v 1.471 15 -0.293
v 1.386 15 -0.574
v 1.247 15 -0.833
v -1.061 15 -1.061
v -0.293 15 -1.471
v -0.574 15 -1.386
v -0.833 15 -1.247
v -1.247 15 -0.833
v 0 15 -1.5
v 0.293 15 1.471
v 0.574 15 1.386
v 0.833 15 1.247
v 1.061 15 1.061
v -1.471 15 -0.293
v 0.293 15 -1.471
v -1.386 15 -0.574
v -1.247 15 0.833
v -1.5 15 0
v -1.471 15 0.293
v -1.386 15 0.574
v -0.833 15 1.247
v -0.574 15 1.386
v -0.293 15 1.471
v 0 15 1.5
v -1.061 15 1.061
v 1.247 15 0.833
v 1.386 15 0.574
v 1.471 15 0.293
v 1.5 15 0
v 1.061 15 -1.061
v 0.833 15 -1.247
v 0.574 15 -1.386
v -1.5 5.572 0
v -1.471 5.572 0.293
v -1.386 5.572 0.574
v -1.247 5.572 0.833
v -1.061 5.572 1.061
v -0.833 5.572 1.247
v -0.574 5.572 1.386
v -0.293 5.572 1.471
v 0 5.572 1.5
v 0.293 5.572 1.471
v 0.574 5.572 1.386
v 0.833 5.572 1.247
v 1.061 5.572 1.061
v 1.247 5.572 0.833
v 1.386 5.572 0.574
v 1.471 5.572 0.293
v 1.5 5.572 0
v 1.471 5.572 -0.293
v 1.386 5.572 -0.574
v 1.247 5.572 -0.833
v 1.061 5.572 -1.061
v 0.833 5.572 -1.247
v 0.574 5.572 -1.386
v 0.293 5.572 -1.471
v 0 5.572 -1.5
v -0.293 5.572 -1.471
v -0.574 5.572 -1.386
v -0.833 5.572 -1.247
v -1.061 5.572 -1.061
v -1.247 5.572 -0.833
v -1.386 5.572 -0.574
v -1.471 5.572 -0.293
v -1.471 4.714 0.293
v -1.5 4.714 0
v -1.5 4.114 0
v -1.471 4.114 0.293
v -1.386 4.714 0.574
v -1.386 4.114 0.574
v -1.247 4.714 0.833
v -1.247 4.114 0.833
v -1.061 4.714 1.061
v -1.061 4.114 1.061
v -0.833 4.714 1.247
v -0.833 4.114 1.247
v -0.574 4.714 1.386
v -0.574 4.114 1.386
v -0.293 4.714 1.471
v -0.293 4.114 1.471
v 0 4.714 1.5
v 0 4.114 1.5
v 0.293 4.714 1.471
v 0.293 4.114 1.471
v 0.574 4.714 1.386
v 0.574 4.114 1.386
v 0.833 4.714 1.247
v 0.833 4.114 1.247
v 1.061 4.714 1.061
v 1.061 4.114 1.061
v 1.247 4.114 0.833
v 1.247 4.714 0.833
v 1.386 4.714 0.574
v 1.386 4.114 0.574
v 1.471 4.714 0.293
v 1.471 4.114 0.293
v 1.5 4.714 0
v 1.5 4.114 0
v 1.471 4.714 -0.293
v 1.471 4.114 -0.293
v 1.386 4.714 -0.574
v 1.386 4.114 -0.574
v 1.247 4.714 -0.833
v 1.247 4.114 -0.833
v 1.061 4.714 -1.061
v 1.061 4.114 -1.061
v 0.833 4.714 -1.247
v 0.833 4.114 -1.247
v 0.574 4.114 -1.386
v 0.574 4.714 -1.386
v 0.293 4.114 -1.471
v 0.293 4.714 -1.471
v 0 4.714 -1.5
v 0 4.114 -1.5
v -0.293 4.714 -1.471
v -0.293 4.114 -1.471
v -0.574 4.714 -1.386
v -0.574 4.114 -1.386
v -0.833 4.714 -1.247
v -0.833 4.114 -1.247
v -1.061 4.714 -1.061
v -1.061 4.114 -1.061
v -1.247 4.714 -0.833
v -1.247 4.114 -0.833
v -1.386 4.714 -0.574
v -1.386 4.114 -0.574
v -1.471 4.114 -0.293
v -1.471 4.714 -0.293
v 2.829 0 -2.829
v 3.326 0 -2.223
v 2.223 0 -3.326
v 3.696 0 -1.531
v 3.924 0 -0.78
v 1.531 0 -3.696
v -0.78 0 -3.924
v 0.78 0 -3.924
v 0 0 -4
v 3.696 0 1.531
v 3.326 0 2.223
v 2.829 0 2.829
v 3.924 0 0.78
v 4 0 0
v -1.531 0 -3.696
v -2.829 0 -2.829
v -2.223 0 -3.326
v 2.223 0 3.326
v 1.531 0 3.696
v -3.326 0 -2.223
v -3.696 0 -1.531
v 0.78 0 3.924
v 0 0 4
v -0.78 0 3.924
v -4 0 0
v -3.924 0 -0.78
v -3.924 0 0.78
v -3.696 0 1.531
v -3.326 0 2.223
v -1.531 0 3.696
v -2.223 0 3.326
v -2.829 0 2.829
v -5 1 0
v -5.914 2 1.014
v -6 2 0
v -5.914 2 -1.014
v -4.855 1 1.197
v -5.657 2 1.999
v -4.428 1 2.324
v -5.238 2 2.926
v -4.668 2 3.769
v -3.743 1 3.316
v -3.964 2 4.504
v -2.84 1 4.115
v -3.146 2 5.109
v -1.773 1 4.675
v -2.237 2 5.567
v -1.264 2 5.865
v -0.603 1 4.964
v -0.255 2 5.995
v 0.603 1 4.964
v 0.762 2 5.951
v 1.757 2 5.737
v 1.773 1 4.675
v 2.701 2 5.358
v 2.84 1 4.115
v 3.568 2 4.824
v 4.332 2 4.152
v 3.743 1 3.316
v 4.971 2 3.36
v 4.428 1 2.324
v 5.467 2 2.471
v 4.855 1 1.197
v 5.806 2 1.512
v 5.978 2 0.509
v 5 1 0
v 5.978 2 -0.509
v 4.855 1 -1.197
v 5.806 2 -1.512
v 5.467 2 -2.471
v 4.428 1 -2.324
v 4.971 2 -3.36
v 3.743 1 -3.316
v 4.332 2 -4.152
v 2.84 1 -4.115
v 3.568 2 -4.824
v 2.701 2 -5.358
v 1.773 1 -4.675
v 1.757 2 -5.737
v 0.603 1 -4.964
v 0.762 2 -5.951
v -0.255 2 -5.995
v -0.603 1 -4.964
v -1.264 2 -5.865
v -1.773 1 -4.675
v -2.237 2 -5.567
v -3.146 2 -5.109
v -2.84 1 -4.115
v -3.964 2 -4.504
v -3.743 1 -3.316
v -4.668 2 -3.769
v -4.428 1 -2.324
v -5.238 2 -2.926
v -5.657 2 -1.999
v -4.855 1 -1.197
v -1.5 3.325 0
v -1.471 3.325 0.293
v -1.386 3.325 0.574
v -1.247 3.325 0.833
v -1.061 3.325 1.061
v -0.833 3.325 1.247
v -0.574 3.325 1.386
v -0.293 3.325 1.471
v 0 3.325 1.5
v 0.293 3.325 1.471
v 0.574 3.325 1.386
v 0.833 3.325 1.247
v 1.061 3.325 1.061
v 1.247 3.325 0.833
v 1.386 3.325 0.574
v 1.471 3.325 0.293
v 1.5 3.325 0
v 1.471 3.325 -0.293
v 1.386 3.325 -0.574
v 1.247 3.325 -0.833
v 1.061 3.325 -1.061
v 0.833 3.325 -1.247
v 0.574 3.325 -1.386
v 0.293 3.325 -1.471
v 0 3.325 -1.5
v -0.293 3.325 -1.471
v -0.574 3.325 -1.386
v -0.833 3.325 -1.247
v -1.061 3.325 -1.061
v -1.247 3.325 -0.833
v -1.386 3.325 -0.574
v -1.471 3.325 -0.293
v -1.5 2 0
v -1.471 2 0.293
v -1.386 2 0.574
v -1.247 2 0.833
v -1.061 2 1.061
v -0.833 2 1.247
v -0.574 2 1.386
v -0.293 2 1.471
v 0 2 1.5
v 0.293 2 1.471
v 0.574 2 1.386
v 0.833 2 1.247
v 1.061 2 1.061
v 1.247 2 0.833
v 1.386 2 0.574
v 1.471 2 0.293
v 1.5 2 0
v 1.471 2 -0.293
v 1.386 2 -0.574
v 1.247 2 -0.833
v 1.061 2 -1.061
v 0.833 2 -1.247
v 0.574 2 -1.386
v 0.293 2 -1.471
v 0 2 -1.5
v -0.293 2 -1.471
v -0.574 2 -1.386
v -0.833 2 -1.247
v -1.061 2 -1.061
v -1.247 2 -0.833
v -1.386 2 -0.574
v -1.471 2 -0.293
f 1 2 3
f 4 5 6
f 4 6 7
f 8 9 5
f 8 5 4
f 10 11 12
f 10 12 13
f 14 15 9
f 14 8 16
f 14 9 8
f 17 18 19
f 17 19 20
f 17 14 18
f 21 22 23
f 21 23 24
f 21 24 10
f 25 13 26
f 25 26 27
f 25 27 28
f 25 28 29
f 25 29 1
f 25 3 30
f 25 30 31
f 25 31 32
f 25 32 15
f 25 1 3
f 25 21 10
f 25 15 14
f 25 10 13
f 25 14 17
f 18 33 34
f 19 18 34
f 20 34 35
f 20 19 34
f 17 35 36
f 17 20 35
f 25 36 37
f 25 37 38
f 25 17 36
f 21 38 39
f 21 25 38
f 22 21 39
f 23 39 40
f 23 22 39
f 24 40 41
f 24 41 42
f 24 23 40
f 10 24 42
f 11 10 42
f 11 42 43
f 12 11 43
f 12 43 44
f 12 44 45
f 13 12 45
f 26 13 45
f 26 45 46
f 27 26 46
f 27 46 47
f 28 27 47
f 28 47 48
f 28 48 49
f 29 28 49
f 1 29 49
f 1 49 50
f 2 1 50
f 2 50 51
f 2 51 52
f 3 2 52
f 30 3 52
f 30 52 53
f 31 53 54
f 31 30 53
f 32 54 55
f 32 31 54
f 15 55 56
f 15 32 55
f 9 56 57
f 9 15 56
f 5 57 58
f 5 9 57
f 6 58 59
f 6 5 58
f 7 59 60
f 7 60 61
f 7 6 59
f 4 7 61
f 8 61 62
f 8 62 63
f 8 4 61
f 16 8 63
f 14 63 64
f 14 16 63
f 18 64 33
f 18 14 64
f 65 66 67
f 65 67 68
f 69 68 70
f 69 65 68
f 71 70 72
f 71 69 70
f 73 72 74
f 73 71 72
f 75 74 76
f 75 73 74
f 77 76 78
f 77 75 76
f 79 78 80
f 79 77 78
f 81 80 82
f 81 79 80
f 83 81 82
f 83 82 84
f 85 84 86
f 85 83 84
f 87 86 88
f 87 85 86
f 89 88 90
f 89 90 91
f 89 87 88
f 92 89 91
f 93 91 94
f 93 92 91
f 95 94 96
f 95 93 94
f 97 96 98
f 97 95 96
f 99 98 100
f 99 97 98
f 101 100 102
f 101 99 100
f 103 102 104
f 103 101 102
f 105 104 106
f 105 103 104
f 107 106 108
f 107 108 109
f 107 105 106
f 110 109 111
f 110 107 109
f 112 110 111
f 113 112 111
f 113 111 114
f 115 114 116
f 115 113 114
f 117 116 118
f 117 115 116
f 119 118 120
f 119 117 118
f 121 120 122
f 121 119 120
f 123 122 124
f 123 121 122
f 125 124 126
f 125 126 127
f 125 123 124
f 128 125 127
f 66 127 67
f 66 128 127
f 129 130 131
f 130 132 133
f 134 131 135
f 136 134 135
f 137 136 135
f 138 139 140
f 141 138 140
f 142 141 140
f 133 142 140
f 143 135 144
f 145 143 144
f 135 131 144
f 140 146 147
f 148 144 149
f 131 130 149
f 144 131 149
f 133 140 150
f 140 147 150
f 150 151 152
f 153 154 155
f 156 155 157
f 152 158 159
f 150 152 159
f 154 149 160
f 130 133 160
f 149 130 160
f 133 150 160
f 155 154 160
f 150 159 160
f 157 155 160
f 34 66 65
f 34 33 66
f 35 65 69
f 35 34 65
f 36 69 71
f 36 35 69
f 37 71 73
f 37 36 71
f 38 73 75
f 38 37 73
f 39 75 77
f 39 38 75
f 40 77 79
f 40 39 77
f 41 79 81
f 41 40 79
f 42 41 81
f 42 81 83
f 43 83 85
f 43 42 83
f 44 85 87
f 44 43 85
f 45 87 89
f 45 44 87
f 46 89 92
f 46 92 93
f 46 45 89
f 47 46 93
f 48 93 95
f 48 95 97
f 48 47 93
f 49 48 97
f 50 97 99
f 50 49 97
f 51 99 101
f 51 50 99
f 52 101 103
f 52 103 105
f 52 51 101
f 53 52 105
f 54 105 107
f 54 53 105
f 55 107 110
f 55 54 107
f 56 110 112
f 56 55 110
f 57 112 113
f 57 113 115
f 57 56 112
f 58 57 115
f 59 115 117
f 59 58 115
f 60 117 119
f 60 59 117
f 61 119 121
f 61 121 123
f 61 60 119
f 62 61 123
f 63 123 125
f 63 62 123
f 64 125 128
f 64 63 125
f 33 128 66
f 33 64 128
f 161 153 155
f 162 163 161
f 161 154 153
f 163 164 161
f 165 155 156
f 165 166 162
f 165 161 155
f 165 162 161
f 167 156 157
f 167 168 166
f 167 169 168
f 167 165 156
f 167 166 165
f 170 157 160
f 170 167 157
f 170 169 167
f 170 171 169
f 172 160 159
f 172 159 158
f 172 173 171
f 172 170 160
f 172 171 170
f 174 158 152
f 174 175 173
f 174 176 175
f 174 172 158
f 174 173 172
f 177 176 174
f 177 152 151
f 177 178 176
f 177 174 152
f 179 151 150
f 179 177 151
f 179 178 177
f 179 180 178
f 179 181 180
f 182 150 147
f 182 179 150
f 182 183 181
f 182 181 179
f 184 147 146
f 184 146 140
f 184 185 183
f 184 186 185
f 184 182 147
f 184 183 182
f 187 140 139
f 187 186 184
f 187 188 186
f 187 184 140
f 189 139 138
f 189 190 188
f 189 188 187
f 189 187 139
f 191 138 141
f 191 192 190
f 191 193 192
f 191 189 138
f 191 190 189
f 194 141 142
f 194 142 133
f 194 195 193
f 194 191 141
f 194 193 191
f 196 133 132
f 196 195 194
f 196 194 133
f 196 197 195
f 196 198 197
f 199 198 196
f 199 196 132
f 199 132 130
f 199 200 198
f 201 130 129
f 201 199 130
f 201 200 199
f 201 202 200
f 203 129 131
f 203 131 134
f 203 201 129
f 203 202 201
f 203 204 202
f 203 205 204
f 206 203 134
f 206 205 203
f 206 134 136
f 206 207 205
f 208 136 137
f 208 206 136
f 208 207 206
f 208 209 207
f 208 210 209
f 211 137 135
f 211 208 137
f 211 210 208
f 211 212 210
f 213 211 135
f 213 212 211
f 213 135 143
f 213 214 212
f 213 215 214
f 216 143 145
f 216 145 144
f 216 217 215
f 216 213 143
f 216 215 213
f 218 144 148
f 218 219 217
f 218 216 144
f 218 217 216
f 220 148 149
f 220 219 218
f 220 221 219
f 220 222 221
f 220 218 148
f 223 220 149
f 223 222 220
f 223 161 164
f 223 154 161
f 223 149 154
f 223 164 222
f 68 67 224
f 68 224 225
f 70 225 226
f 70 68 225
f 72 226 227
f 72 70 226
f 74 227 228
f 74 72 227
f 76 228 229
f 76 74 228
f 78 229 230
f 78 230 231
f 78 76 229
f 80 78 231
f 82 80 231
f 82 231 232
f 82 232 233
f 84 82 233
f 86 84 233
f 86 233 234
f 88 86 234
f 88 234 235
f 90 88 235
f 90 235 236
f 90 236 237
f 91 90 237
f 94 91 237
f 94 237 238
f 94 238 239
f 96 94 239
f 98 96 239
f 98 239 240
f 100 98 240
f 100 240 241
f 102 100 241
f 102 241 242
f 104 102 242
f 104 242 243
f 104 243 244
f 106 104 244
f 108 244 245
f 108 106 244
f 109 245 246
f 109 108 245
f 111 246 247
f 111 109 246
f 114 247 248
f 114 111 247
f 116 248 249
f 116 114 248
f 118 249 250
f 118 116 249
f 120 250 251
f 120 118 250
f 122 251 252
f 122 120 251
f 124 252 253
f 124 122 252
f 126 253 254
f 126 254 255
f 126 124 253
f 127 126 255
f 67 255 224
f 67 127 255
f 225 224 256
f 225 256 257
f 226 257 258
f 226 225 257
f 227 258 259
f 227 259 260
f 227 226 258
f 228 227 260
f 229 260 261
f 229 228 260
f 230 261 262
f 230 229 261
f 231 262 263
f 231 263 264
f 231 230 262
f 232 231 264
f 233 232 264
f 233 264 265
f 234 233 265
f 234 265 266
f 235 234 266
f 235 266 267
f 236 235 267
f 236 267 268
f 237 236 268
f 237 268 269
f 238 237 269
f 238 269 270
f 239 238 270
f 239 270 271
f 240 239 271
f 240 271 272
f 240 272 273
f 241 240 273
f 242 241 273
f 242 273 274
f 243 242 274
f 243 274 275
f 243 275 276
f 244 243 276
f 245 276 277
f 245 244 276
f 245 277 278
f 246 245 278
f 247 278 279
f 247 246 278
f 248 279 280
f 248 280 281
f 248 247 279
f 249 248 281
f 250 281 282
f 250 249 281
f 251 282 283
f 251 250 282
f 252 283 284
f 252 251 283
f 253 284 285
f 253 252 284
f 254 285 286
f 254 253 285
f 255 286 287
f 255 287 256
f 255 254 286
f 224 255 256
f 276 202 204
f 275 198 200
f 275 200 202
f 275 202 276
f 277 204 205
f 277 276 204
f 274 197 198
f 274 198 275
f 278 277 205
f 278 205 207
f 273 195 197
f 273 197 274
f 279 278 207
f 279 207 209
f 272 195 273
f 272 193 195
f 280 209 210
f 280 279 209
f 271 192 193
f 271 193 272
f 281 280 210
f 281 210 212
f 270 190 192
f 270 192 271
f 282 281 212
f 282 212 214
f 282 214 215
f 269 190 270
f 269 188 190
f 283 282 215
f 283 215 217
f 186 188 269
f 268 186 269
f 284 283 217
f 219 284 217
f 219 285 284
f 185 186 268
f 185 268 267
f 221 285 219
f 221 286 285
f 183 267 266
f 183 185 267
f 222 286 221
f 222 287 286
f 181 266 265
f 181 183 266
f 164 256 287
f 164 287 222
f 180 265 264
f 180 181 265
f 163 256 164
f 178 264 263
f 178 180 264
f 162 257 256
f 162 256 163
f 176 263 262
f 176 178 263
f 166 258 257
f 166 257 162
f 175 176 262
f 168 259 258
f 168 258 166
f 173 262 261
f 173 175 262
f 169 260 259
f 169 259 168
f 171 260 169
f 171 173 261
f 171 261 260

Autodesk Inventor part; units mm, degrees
ref_plane "YZ Plane" through (0, 0, 0) normal (1, 0, 0) x (0, 1, 0)
ref_plane "XZ Plane" through (0, 0, 0) normal (0, 1, 0) x (-1, 0, 0)
ref_plane "XY Plane" through (0, 0, 0) normal (0, 0, 1) x (1, 0, 0)
sketch "Sketch2" plane through (0, 0, 0) normal (0, 0, 1) x (1, 0, 0)
  line L0 (0, -3.6) -> (0, 21.6) construction
  line L1 (-7.2, 0) -> (1.2, 0) construction
  line L2 (0, 0) -> (-6, 0)
  line L3 (-6, 2) -> (-1.5, 2)
  line L4 (-1.5, 2) -> (-1.5, 4.114)
  line L5 (-1.5, 4.7135) -> (-1.5, 15)
  line L6 (-1.5, 15) -> (0, 15)
  line L7 (0, 0) -> (-6, 0)
  line L8 (-6, 2) -> (-6, 0)
  line L9 (-1.5, 3.3248) -> (-1.5, 5.5716)
  line L10 (0, 15) -> (0, 0)
  point P0 (-1.5, 4.114)
  dimension "d0" = 1.5
  dimension "d1" = 6
  dimension "d3" = 2
  dimension "HighRod" = 13
revolve "Revolution1" add sketch "Sketch2" angle 360 about axis through (0, -10, 0) along (0, 1, 0)
chamfer "Chamfer_top" [suppressed]
chamfer "Chamfer_bottom" distance 2 angle 45 1 edges at (6, 0, 0)
properties part number "P006" material "Aluminium"
